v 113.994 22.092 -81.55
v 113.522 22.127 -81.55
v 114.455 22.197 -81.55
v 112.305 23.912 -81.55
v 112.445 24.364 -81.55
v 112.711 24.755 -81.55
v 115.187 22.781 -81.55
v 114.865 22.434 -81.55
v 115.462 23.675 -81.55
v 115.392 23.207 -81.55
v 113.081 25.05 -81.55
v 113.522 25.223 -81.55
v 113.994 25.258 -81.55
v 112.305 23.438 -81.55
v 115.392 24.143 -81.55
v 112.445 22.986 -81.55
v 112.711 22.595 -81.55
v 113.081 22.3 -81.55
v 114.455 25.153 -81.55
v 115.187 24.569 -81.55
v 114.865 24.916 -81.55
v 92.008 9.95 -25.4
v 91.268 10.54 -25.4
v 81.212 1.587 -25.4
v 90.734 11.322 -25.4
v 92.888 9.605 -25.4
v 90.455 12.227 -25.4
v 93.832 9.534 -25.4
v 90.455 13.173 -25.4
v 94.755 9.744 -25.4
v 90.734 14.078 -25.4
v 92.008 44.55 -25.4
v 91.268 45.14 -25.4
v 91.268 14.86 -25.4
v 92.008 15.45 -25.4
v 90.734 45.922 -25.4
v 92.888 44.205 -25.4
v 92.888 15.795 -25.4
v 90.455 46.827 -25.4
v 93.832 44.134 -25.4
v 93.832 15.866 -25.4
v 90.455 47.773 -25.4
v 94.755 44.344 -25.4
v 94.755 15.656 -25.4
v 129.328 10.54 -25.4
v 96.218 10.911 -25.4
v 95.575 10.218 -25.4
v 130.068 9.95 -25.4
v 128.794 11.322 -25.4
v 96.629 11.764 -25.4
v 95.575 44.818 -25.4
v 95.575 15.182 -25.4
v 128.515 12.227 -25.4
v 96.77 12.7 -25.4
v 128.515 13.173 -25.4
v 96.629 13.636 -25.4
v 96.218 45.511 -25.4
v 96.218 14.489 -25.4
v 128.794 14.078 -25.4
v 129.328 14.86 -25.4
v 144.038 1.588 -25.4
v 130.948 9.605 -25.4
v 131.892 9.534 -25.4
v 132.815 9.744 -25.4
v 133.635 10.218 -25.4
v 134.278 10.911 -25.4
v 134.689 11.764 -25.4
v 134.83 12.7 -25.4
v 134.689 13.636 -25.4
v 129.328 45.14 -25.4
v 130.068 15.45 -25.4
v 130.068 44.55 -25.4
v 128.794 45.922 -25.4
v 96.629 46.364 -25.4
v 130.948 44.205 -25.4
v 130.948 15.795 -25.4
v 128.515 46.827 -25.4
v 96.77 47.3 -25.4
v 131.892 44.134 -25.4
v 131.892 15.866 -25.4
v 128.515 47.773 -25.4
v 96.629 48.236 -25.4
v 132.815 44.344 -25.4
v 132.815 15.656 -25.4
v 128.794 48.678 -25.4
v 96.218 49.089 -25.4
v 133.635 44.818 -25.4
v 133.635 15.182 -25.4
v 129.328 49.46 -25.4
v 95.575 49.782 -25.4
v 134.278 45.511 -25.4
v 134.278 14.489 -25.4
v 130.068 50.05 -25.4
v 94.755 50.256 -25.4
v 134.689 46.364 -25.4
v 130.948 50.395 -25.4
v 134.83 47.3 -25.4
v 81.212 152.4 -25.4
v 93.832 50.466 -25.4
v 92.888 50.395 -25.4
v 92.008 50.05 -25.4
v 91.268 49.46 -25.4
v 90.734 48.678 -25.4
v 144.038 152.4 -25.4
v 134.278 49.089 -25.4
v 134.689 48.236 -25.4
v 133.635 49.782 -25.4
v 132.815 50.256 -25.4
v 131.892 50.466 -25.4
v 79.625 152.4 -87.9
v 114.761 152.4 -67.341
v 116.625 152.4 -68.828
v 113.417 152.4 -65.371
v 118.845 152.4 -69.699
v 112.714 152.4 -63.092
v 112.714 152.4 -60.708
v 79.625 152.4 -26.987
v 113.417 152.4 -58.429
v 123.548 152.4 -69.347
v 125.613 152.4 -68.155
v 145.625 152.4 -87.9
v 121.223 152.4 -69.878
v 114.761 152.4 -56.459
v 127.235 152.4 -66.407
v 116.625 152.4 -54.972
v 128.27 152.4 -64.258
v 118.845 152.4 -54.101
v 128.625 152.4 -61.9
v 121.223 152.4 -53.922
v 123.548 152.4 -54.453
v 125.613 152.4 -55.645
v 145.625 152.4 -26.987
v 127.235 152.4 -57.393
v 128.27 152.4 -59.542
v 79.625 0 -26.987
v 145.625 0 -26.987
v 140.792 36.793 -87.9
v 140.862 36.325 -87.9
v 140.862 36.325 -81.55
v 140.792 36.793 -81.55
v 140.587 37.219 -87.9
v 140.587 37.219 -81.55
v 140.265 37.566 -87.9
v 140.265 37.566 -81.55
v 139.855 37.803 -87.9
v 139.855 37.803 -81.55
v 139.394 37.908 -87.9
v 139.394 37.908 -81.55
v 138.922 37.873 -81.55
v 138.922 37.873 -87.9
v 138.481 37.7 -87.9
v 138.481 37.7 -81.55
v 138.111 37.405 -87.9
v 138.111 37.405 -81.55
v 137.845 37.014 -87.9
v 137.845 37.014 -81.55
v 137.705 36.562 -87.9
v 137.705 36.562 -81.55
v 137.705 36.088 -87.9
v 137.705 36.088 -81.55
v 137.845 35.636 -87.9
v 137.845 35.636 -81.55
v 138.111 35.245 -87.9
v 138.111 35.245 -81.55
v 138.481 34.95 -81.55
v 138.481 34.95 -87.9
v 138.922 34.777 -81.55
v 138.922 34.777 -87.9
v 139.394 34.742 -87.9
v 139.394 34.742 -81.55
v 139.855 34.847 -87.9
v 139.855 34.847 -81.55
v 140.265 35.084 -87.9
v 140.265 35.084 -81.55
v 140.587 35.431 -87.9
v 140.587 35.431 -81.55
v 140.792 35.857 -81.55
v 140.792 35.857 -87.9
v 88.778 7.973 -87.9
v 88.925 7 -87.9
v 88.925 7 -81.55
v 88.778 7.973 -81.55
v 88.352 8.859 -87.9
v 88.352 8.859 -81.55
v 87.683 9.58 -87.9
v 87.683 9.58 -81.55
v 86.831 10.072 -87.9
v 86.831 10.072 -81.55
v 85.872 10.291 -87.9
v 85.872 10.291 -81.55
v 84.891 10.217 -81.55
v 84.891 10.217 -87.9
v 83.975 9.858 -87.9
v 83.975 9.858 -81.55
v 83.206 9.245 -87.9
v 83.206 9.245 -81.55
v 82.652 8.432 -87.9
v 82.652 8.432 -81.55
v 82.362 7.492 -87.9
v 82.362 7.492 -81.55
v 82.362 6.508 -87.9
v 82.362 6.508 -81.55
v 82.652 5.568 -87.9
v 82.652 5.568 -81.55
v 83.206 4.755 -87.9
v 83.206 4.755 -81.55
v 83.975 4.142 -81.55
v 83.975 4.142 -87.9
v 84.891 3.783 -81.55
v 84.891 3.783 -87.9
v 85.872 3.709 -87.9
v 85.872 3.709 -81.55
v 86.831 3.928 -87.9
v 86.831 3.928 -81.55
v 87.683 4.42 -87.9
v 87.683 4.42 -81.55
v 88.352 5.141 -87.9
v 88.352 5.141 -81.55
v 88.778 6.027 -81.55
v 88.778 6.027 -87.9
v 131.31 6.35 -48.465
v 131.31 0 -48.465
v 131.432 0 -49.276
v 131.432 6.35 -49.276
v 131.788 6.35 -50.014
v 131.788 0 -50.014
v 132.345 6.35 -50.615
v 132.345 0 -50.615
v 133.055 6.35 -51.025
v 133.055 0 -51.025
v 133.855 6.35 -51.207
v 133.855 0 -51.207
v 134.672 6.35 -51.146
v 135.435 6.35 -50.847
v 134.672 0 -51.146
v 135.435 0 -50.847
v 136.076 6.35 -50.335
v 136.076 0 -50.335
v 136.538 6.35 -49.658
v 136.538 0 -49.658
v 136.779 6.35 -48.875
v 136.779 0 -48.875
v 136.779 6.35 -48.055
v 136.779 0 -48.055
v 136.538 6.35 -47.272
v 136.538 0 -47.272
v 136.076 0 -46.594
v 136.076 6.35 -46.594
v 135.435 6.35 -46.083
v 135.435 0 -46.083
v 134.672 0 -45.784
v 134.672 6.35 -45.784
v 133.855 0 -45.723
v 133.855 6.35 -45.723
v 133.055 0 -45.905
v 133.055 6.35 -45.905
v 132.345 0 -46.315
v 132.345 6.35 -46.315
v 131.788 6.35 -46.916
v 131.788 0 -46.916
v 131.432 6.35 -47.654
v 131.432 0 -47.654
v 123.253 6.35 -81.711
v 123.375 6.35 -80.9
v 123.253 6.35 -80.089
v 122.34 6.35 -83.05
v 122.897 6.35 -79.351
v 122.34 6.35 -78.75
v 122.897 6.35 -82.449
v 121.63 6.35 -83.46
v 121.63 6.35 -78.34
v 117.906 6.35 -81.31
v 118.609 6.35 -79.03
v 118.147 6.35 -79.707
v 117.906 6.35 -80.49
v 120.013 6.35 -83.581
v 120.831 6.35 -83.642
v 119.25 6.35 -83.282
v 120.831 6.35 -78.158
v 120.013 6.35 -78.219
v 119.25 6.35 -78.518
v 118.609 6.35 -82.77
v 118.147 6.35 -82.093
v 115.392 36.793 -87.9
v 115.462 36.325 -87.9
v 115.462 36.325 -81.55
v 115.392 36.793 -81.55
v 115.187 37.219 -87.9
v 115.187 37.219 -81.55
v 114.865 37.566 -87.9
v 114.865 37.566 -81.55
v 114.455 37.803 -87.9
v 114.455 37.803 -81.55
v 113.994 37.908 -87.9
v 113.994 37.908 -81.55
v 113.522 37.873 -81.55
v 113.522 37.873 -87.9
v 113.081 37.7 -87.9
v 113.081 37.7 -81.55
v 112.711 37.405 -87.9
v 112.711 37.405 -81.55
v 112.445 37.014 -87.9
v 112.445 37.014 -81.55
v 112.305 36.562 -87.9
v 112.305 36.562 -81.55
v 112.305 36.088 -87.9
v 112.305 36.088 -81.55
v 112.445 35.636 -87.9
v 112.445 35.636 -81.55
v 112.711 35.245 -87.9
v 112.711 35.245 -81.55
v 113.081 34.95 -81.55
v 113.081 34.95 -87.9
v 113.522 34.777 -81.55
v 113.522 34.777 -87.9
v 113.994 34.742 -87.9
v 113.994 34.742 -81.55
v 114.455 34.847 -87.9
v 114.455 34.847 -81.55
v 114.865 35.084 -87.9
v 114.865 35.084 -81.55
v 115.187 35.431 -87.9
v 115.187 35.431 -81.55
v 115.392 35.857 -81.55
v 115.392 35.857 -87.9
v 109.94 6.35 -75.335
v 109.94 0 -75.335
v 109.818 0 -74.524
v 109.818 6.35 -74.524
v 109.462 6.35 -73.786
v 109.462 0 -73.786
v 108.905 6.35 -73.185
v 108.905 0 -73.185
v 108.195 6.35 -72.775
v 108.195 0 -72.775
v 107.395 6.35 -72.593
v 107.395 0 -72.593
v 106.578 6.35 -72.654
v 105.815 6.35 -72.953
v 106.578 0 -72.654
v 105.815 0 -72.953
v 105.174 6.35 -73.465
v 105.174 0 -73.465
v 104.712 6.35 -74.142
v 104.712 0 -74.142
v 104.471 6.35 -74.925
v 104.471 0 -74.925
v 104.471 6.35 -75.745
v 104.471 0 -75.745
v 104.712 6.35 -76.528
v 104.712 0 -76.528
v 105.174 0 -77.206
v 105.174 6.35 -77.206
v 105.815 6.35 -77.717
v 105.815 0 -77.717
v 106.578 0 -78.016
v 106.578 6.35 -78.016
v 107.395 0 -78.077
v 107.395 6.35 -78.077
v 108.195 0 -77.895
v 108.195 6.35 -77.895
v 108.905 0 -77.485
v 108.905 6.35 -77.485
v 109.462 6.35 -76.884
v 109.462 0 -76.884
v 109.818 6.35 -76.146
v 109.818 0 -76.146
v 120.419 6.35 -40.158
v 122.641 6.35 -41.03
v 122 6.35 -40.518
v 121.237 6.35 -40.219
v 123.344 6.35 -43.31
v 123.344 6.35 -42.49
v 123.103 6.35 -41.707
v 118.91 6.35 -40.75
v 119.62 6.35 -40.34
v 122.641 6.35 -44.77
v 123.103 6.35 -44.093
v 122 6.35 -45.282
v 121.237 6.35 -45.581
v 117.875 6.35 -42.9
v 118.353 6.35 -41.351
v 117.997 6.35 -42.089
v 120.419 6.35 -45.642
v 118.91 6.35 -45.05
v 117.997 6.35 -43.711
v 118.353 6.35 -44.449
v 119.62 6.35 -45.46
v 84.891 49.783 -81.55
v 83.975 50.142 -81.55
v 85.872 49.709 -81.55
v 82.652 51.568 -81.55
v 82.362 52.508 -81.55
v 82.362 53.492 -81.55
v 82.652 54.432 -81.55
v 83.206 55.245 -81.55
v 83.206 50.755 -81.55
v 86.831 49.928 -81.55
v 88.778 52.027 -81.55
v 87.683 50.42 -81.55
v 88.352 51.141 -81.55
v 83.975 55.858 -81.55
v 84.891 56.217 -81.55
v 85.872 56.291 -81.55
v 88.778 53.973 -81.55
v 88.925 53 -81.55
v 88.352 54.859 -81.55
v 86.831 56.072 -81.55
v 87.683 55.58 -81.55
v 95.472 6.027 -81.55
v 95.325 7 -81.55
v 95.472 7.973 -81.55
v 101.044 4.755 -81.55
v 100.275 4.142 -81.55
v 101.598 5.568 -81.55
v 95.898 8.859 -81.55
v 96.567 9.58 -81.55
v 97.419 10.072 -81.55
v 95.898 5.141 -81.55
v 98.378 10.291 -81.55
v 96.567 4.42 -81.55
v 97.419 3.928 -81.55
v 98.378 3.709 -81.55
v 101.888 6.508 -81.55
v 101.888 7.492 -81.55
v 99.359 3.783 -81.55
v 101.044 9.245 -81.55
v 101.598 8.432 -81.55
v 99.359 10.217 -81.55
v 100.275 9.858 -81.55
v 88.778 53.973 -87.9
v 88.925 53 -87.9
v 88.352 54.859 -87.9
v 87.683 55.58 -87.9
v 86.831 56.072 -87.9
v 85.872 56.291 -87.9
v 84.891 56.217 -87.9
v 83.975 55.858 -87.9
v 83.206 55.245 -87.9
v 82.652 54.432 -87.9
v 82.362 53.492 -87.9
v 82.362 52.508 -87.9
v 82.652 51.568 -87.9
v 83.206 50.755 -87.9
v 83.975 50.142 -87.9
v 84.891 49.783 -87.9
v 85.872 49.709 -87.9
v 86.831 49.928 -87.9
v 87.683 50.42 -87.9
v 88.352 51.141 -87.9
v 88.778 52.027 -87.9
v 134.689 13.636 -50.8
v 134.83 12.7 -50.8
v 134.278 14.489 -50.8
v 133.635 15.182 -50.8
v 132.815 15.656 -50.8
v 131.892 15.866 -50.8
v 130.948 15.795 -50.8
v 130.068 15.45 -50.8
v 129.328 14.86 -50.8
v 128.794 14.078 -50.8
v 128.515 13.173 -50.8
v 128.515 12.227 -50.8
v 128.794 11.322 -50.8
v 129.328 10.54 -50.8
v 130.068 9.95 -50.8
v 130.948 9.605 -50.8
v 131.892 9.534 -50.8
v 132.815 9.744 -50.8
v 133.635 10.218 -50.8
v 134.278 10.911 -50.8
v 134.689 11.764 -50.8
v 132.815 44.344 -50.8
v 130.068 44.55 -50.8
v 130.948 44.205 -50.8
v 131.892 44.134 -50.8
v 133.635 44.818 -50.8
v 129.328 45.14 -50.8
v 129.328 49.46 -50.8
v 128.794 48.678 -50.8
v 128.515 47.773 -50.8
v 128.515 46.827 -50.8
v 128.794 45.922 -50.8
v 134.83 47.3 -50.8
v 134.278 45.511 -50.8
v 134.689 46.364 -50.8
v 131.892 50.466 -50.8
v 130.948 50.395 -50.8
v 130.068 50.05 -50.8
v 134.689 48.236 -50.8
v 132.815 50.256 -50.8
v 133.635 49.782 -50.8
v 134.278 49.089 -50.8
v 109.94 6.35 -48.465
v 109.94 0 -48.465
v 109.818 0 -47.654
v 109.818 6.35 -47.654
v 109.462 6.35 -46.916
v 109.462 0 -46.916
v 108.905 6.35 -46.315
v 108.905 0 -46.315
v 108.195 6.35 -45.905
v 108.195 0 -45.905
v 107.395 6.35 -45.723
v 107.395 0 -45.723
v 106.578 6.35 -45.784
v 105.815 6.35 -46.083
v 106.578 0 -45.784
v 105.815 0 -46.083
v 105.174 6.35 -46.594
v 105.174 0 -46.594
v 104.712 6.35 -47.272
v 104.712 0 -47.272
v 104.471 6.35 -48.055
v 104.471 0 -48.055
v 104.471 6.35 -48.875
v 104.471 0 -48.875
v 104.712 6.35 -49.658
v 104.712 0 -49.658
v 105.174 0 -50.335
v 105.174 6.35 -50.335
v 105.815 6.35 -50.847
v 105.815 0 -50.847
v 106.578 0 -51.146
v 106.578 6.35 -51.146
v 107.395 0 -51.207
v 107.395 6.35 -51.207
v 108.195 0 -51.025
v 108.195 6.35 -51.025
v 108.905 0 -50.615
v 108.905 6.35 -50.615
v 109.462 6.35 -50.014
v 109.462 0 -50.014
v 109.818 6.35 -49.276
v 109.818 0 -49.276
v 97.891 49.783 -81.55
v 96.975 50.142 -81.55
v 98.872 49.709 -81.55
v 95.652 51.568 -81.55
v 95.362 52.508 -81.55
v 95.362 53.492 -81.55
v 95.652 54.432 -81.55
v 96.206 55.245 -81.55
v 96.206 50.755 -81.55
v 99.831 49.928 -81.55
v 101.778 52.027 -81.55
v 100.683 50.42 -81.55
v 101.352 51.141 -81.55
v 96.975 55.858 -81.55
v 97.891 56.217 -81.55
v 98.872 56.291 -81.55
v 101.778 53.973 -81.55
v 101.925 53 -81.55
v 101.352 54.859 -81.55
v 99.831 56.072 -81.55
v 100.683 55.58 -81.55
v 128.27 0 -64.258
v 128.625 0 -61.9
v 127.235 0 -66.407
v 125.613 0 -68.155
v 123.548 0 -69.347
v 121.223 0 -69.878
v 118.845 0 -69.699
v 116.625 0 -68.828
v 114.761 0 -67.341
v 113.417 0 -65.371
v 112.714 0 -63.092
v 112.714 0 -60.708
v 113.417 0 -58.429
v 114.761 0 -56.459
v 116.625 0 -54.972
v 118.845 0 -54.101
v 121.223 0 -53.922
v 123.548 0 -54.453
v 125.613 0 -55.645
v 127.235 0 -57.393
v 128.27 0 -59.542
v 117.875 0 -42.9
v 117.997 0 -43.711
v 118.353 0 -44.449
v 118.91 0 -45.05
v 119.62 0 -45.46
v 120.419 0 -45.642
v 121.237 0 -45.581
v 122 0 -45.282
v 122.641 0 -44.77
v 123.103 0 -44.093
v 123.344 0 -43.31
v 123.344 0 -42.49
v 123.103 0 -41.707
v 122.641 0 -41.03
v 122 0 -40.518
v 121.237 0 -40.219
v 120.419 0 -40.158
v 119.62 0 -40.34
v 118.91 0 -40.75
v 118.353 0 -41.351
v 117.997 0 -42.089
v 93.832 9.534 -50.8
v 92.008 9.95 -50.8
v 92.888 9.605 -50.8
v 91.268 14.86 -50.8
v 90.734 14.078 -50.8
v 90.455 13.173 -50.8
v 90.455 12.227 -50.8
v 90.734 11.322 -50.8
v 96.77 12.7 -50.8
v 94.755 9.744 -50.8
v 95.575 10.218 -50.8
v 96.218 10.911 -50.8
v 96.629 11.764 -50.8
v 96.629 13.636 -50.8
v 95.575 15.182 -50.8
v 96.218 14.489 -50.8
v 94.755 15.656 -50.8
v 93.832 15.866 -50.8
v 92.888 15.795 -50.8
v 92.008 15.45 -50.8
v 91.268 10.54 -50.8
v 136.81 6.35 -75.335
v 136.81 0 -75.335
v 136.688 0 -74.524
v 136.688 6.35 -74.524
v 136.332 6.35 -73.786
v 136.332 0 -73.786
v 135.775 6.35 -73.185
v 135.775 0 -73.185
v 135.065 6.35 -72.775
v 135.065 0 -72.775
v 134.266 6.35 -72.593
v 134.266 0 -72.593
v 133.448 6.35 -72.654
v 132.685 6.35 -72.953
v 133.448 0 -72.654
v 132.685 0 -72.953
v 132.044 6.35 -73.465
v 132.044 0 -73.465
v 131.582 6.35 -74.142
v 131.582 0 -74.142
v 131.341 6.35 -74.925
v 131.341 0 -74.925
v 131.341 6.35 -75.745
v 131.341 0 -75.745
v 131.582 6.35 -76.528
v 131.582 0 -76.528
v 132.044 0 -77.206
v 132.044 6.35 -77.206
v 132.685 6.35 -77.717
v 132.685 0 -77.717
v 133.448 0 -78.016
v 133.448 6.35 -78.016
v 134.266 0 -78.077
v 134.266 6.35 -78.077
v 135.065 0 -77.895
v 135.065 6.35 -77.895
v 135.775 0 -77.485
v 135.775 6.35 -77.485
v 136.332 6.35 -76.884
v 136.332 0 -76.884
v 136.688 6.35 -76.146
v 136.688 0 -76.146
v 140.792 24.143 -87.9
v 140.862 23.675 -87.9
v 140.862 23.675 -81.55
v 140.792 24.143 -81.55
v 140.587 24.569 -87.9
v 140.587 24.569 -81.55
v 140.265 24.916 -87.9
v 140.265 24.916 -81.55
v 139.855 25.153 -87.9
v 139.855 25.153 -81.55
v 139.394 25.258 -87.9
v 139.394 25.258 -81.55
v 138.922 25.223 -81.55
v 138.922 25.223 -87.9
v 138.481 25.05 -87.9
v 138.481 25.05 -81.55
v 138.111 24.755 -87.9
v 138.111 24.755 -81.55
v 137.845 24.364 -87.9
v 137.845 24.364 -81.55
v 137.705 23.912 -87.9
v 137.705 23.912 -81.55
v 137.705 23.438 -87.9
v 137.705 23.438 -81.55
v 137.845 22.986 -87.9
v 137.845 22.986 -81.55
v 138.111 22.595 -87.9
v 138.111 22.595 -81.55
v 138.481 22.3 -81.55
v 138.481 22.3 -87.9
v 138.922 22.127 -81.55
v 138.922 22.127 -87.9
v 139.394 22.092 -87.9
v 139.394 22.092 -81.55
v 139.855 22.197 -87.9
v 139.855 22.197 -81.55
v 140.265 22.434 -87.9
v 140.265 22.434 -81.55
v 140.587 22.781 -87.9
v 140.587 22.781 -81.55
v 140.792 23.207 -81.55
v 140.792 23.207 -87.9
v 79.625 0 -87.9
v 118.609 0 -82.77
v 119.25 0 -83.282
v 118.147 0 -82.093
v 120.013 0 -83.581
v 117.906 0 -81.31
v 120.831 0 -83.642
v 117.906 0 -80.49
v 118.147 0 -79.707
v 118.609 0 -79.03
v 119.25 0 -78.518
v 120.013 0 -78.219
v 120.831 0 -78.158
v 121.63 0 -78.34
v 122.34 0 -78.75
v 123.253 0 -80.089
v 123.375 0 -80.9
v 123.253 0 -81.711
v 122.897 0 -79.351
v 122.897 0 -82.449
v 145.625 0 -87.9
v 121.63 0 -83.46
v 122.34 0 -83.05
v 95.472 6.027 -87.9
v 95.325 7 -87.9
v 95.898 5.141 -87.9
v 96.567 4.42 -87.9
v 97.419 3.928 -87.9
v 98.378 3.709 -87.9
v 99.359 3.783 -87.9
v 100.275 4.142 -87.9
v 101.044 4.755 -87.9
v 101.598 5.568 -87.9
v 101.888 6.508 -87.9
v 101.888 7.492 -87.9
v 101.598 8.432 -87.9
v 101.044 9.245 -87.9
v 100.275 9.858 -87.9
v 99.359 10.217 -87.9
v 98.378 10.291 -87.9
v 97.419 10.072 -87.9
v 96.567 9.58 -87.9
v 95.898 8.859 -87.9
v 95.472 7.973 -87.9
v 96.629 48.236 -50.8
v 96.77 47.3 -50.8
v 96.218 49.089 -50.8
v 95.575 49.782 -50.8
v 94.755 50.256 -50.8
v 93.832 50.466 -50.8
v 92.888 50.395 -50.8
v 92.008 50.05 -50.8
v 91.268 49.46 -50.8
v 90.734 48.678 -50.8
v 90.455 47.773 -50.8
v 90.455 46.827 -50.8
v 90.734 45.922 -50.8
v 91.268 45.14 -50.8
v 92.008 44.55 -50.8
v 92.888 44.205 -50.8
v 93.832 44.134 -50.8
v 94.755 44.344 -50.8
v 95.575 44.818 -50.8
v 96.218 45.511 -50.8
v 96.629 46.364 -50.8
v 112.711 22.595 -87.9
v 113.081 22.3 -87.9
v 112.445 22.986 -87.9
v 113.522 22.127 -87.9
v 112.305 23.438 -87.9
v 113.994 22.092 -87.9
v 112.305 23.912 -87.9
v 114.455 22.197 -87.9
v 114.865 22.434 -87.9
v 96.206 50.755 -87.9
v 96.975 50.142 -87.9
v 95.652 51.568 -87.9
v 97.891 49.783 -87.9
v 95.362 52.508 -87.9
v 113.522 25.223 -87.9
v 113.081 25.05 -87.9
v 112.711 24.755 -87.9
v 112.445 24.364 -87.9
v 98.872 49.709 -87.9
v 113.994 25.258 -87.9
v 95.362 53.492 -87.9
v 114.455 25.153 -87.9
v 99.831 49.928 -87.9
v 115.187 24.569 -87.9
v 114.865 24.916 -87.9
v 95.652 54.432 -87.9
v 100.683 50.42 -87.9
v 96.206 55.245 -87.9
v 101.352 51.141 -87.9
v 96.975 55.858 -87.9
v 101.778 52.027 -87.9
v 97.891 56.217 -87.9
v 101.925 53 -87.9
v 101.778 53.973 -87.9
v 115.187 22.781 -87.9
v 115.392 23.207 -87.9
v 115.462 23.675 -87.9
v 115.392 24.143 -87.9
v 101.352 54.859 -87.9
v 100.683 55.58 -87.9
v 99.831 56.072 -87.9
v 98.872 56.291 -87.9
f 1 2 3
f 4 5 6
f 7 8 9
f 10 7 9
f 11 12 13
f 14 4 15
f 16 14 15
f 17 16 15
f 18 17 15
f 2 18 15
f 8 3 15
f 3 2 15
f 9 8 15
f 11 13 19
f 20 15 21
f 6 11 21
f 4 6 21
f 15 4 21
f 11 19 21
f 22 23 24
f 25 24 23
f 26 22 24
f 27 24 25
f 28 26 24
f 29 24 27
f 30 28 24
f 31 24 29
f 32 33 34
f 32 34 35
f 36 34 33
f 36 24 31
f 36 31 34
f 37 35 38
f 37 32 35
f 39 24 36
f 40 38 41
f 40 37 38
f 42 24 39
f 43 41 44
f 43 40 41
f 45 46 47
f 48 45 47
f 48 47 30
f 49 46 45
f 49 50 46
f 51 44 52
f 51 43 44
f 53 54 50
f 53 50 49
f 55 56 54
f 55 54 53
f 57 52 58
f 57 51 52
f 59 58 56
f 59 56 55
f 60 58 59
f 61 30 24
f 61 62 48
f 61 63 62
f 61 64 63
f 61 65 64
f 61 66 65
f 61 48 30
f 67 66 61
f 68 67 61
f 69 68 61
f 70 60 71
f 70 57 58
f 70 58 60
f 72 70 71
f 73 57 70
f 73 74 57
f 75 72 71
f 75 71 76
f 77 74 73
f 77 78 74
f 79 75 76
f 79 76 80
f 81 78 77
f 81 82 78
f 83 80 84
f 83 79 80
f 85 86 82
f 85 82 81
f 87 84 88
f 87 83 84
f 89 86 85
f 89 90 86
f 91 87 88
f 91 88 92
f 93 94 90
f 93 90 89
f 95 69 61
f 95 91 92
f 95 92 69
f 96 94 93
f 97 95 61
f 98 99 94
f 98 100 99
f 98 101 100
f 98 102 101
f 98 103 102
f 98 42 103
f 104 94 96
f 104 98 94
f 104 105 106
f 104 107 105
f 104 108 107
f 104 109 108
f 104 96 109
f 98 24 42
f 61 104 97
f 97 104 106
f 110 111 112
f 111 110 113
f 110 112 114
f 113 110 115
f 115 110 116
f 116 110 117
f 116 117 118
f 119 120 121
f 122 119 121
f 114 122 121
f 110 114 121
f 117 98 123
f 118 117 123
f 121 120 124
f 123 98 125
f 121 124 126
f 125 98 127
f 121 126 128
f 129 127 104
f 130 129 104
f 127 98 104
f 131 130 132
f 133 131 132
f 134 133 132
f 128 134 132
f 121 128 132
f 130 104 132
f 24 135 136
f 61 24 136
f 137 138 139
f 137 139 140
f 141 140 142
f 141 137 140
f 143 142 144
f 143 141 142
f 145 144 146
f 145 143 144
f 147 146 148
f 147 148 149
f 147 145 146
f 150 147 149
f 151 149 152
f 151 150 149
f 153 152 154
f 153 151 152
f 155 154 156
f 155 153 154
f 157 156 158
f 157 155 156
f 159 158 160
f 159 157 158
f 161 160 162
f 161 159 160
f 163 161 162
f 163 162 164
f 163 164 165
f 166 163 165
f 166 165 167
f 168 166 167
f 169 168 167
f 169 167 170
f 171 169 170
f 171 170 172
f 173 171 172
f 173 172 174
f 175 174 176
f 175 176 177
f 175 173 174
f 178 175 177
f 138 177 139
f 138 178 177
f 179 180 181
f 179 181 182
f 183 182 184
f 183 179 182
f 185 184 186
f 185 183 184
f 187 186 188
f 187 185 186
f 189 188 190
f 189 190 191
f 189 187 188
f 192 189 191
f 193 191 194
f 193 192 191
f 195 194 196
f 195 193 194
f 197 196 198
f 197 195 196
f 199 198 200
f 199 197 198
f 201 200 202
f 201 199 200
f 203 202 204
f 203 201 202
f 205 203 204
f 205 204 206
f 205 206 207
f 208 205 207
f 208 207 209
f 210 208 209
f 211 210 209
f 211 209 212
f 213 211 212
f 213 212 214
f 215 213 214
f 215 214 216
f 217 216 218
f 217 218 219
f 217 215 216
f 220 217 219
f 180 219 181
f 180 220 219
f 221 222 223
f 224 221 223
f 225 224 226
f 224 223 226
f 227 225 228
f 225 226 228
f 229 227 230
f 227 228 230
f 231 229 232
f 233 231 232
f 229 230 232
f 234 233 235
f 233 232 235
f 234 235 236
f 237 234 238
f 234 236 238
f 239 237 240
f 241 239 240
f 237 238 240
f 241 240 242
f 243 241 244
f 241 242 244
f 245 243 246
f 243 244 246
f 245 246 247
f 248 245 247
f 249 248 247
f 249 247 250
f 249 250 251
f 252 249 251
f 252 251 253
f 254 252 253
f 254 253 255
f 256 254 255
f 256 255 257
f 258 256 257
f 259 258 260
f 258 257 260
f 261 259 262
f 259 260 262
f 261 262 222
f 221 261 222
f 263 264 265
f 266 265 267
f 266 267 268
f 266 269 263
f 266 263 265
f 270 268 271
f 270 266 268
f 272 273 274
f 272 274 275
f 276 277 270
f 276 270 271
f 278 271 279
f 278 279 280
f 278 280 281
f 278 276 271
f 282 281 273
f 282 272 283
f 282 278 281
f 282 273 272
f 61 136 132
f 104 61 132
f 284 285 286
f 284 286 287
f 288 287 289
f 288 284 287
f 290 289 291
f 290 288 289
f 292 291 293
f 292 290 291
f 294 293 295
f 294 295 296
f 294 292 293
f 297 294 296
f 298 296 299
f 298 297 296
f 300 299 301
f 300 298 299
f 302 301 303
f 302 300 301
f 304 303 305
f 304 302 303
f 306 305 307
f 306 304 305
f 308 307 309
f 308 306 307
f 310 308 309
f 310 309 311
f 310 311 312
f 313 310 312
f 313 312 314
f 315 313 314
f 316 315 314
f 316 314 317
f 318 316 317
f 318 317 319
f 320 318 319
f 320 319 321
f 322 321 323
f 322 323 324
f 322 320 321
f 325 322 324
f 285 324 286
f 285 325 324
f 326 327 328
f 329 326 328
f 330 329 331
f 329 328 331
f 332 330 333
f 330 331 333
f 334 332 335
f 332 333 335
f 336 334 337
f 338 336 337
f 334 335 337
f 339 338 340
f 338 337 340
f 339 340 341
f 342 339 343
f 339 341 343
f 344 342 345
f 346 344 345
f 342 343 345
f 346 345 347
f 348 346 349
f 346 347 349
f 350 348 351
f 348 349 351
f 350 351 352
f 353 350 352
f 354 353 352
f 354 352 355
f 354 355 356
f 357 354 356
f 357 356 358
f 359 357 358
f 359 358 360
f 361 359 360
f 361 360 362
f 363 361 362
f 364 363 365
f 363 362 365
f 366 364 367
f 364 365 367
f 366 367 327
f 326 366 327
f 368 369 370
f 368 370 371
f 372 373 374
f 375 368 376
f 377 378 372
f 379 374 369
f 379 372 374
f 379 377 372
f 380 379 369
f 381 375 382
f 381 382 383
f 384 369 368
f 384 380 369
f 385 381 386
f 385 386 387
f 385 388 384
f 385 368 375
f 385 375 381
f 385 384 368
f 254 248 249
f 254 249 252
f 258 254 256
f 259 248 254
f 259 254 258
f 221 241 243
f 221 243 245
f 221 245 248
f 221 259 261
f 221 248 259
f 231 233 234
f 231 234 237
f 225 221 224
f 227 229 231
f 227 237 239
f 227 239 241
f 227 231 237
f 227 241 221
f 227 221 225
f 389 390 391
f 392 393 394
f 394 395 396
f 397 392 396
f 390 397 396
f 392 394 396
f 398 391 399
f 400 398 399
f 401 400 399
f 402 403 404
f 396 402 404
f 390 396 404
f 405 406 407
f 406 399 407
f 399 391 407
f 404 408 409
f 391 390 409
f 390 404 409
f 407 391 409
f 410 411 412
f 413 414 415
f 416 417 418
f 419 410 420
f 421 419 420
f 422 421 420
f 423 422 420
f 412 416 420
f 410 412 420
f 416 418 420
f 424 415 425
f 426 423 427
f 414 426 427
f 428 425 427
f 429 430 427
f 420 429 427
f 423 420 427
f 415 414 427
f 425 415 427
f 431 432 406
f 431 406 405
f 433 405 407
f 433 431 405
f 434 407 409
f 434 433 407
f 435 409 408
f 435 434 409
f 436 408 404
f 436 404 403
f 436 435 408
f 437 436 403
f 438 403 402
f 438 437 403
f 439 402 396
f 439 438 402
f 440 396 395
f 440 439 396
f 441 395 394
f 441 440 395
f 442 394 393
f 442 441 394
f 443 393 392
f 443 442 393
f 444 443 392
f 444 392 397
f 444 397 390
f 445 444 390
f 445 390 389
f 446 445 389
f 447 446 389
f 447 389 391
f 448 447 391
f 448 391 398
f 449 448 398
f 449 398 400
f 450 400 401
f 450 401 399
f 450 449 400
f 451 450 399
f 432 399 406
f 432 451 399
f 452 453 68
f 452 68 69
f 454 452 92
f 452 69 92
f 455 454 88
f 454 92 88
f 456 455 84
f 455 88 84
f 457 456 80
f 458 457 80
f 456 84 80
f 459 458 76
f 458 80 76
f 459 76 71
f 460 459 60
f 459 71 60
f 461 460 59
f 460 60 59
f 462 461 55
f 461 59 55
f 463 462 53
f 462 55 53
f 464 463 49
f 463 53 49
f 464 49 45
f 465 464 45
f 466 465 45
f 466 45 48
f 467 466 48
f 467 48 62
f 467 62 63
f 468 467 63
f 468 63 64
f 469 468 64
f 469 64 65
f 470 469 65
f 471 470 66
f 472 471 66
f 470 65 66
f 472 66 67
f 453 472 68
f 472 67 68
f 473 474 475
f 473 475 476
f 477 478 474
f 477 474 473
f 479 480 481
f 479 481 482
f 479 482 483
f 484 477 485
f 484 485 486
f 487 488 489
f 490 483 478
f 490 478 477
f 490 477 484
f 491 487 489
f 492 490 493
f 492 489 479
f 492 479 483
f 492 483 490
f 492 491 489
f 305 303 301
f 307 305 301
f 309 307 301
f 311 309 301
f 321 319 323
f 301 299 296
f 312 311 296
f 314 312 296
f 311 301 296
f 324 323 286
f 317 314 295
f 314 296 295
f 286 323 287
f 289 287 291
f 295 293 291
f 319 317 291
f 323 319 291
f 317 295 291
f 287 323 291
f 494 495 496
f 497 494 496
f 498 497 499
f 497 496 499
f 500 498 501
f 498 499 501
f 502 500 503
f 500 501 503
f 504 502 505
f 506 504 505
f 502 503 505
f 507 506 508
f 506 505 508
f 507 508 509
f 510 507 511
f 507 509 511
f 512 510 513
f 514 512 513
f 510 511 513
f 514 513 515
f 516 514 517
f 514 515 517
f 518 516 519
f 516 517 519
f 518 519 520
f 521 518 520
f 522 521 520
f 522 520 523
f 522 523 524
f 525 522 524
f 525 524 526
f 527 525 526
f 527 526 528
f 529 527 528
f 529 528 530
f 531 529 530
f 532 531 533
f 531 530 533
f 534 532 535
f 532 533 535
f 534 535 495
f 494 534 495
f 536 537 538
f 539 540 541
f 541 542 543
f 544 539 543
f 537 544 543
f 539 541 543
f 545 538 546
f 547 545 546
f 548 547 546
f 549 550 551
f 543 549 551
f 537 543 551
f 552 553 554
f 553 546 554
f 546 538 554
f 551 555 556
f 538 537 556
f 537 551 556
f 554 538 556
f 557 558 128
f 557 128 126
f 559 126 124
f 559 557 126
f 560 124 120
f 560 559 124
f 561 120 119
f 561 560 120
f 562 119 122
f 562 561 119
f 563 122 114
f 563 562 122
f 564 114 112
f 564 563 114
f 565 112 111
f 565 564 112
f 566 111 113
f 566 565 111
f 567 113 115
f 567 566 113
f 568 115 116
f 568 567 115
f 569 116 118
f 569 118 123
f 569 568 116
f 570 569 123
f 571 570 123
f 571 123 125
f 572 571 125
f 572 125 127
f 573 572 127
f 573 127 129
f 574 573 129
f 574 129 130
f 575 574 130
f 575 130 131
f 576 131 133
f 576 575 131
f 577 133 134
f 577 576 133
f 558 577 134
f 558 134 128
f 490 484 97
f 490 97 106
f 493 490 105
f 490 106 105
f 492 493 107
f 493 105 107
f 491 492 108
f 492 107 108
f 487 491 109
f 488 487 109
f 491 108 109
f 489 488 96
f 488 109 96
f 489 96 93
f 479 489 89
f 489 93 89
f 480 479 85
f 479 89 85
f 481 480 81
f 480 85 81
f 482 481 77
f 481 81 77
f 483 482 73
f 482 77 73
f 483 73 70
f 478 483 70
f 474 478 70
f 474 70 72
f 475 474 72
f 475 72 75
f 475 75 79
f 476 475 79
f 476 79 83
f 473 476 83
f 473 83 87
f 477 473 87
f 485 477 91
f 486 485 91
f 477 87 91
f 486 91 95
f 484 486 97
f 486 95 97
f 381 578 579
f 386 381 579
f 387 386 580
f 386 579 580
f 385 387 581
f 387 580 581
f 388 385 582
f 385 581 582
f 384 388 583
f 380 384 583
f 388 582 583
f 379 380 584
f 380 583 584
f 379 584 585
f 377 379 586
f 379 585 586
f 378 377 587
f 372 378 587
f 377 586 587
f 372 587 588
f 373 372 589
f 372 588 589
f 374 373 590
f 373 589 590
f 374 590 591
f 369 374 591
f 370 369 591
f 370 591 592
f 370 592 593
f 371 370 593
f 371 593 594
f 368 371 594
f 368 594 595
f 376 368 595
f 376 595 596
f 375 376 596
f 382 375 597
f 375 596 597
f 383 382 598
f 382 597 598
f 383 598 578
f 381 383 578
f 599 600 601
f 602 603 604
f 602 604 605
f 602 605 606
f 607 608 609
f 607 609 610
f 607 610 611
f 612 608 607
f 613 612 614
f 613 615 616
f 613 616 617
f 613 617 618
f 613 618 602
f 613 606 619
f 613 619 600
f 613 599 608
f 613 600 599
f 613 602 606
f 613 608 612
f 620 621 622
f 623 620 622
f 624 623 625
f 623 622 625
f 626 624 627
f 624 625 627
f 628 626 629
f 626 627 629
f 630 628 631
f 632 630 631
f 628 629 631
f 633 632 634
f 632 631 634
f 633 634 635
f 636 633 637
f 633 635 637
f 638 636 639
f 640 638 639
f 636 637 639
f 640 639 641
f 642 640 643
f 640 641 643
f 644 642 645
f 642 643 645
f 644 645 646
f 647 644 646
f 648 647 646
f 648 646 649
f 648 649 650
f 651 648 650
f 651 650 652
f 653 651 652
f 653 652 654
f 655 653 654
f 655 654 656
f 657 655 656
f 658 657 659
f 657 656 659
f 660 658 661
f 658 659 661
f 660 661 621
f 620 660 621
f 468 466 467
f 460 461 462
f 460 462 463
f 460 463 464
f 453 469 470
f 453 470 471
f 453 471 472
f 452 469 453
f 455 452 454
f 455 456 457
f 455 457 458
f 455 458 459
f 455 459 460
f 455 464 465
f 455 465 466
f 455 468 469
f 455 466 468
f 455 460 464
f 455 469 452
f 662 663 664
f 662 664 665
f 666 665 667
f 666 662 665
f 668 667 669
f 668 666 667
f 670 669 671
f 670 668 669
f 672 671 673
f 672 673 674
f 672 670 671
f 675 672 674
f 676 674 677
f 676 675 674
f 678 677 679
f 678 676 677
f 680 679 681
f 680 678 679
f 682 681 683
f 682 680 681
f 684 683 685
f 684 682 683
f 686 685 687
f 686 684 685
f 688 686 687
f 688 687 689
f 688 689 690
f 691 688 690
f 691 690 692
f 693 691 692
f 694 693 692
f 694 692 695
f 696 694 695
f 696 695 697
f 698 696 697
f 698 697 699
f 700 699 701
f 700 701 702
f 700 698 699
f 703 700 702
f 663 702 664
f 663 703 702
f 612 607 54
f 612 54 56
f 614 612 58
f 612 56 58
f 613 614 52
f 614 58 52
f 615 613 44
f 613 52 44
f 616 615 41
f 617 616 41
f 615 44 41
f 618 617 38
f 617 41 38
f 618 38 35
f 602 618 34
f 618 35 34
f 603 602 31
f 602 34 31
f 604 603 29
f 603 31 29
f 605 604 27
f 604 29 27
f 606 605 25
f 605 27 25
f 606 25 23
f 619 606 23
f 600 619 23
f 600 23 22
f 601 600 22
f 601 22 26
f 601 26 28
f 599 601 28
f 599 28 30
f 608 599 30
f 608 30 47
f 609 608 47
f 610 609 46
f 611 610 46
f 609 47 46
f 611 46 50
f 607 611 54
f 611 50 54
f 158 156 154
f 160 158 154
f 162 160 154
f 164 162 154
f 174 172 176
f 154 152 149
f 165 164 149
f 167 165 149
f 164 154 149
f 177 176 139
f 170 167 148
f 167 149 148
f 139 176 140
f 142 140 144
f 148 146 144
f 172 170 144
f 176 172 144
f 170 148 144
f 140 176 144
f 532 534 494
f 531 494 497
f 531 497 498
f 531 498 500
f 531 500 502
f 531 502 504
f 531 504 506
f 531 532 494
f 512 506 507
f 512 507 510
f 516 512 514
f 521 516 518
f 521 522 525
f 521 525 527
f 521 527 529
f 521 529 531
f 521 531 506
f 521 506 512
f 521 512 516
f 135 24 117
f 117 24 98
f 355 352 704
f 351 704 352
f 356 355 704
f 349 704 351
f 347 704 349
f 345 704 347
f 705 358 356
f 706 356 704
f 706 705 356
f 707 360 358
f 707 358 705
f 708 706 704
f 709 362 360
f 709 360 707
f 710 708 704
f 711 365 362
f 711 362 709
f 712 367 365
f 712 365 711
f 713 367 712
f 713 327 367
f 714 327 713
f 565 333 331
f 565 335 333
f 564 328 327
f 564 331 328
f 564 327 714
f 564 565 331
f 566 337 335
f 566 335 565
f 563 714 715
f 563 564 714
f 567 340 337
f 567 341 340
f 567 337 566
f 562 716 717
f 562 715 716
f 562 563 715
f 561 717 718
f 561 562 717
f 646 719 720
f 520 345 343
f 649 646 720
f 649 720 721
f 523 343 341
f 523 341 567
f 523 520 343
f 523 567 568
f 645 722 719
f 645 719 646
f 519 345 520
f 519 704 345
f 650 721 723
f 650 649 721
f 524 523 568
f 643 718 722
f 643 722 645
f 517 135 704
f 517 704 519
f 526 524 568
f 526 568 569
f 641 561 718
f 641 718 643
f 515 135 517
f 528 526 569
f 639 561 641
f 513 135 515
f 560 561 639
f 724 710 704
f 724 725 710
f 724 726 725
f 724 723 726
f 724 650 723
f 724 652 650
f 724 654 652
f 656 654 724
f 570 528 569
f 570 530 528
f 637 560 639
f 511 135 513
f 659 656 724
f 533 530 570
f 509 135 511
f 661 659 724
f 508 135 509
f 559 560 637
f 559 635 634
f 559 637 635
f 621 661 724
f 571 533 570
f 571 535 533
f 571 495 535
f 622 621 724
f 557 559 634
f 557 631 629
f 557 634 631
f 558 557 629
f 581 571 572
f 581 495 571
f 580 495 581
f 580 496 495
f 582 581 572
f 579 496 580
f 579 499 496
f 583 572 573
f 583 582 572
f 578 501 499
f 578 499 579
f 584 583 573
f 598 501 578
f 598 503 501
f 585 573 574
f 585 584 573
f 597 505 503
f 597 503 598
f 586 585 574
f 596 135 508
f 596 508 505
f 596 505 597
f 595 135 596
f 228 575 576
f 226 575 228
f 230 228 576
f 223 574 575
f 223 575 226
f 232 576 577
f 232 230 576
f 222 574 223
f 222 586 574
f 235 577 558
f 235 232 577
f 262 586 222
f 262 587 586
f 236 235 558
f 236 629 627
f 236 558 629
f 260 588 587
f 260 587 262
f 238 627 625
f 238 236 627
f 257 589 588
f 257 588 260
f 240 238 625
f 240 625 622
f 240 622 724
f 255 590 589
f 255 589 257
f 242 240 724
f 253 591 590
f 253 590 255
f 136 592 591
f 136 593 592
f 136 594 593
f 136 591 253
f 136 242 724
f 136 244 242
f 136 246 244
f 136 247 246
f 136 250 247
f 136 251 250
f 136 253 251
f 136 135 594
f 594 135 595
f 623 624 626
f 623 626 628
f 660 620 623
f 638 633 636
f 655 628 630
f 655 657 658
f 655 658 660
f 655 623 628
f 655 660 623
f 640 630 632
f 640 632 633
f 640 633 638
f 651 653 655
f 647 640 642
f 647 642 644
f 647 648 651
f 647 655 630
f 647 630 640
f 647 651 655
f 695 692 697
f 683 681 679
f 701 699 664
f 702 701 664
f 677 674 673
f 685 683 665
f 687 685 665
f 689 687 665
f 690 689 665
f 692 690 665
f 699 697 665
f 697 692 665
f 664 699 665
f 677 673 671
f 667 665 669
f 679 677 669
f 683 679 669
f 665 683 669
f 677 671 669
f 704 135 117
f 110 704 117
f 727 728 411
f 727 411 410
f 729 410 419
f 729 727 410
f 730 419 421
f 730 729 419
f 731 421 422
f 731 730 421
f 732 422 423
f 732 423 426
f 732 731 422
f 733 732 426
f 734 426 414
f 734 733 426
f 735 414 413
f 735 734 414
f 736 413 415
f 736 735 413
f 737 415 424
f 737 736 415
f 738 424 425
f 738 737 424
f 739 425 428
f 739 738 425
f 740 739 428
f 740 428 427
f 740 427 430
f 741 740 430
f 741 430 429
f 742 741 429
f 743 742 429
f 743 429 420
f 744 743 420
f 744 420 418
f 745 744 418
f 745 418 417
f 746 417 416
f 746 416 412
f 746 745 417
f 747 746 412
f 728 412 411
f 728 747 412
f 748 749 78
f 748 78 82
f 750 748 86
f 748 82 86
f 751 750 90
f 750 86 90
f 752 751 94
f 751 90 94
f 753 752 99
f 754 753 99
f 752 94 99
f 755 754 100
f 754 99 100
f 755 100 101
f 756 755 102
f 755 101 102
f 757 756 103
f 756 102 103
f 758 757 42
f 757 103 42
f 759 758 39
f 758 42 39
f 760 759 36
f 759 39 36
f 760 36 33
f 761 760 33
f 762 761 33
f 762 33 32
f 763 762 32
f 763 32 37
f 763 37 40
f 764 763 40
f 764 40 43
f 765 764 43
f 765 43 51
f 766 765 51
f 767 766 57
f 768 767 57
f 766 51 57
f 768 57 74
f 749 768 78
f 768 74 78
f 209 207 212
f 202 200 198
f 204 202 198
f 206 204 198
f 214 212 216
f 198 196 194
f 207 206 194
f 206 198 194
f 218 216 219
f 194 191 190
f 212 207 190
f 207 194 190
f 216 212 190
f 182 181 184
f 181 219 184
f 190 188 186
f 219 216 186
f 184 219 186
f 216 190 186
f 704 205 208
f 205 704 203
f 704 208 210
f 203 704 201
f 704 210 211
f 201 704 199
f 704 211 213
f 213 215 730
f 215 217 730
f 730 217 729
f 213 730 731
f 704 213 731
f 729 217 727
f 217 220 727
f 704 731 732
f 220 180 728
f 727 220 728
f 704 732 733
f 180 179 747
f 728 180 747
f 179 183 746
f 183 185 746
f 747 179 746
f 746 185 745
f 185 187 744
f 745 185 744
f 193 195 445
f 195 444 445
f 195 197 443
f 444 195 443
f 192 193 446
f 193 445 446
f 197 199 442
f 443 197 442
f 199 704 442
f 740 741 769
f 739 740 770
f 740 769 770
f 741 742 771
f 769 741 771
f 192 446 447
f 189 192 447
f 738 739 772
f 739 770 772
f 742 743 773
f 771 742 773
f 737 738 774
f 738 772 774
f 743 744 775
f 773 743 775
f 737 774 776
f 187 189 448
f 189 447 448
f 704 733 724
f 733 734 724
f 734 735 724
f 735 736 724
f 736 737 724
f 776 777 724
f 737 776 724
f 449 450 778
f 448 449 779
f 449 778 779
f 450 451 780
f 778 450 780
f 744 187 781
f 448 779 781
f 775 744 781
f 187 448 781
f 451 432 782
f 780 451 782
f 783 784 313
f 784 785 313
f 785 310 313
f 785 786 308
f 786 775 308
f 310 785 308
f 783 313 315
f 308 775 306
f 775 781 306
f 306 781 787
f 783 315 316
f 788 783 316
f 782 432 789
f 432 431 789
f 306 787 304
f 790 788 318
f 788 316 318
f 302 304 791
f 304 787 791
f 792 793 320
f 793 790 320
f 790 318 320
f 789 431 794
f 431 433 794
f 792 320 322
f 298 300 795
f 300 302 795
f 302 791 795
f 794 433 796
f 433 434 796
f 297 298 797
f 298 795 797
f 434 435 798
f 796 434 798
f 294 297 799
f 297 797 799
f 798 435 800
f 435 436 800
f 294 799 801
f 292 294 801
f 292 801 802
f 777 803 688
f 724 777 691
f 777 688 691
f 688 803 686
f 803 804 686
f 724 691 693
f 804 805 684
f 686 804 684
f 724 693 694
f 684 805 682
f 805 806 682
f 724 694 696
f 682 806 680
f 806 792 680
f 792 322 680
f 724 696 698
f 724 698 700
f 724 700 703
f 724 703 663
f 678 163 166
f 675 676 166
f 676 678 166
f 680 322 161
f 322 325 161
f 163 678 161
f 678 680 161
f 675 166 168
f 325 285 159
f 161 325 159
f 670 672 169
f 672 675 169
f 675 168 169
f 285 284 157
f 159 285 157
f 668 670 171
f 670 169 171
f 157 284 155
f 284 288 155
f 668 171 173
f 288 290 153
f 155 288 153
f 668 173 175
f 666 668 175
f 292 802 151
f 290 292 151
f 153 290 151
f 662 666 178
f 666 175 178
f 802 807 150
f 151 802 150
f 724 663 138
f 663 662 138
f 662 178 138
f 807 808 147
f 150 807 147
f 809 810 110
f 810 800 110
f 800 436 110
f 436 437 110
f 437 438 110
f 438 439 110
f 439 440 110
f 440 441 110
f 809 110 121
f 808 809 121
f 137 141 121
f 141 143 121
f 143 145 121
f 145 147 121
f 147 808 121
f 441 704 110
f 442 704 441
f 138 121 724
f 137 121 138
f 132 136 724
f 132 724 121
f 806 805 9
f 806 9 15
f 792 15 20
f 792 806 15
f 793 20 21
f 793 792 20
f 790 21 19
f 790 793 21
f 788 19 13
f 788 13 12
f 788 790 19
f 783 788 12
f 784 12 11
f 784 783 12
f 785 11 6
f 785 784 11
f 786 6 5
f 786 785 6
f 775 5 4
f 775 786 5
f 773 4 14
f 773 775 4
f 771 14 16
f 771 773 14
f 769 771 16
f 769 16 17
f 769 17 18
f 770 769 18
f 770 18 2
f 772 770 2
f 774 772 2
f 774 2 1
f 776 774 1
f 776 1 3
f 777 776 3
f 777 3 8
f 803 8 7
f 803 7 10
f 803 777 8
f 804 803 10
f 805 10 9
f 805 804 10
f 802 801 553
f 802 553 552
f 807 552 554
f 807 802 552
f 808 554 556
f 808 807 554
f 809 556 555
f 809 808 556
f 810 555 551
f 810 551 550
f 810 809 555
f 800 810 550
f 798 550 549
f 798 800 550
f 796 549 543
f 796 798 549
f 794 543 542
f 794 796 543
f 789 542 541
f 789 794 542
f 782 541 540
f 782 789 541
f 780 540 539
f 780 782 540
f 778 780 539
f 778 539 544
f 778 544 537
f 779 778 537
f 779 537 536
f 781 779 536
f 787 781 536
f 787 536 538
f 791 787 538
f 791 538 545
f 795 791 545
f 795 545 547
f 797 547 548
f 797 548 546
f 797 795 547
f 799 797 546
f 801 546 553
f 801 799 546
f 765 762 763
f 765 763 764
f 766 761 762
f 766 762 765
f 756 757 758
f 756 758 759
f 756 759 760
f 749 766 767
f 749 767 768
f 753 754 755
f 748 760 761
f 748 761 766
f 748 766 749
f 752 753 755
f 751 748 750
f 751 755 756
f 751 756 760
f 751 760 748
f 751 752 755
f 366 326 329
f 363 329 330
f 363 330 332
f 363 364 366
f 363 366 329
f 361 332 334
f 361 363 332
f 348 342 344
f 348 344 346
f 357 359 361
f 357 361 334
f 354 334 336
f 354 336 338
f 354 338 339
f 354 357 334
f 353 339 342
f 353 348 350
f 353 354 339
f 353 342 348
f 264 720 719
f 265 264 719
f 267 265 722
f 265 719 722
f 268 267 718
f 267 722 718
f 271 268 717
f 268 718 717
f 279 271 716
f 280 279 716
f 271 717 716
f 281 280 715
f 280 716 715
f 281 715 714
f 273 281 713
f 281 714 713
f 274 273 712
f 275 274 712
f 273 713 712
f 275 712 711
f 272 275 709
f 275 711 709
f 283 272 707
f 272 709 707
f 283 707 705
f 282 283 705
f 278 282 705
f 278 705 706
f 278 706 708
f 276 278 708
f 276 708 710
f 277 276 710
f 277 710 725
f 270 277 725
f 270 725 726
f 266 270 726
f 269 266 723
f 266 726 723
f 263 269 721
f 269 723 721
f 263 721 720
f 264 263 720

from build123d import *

# Parameters (mm, degrees)
PRIMARY_START           = -25.4
SKETCH2_W               = 66
SKETCH2_H               = 60
SKETCH2_R               = 1.5875
SKETCH2_H_2             = 92.4
PRIMARY_EXTRUSION_DEPTH = 62.5
CUT_EXTRUDE2_START      = -25.4
SKETCH3_R               = 3.175
CUT_EXTRUDE2_DEPTH      = 25.4
CUT_EXTRUDE3_START      = -87.9
SKETCH2_4_R             = 1.5875
CUT_EXTRUDE3_DEPTH      = 6.35
CHAMFER1_SIZE           = 1.5875
CUT_EXTRUDE4_DEPTH      = 6.35
CUT_EXTRUDE5_OUTLINE_R  = 8
CUT_EXTRUDE5_DEPTH      = 152.4


# Read off the part's stored shape, not the designer's step: Cut-Extrude5
with BuildPart() as part:
    # Sketch2 → Primary Extrusion (new body)
    # profile 1 of 10: a face of its own
    with BuildSketch(Plane.XY.offset(PRIMARY_START)):
        with Locations((112.625, 30)):
            Rectangle(SKETCH2_W, SKETCH2_H)
        with BuildLine():
            ThreePointArc((88.925, 7), (85.625, 3.7), (82.325, 7))
            ThreePointArc((82.325, 7), (85.625, 10.3), (88.925, 7))
        make_face(mode=Mode.SUBTRACT)
        with BuildLine():
            ThreePointArc((95.325, 7), (98.625, 10.3), (101.925, 7))
            ThreePointArc((101.925, 7), (98.625, 3.7), (95.325, 7))
        make_face(mode=Mode.SUBTRACT)
        with Locations((113.875, 23.675)):
            Circle(SKETCH2_R, mode=Mode.SUBTRACT)
        with Locations((139.275, 23.675)):
            Circle(SKETCH2_R, mode=Mode.SUBTRACT)
        with Locations((113.875, 36.325)):
            Circle(SKETCH2_R, mode=Mode.SUBTRACT)
        with Locations((139.275, 36.325)):
            Circle(SKETCH2_R, mode=Mode.SUBTRACT)
        with BuildLine():
            ThreePointArc((88.925, 53), (85.625, 49.7), (82.325, 53))
            ThreePointArc((82.325, 53), (85.625, 56.3), (88.925, 53))
        make_face(mode=Mode.SUBTRACT)
        with BuildLine():
            ThreePointArc((101.925, 53), (98.625, 49.7), (95.325, 53))
            ThreePointArc((95.325, 53), (98.625, 56.3), (101.925, 53))
        make_face(mode=Mode.SUBTRACT)
    # profile 2 of 10: a face of its own
    with BuildSketch(Plane.XY.offset(PRIMARY_START)):
        with BuildLine():
            ThreePointArc((82.325, 53), (85.625, 49.7), (88.925, 53))
            ThreePointArc((88.925, 53), (85.625, 56.3), (82.325, 53))
        make_face()
    # profile 3 of 10: a face of its own
    with BuildSketch(Plane.XY.offset(PRIMARY_START)):
        with BuildLine():
            ThreePointArc((95.325, 53), (98.625, 49.7), (101.925, 53))
            ThreePointArc((101.925, 53), (98.625, 56.3), (95.325, 53))
        make_face()
    # profile 4 of 10: a face of its own
    with BuildSketch(Plane.XY.offset(PRIMARY_START)):
        with Locations((113.875, 36.325)):
            Circle(SKETCH2_R)
    # profile 5 of 10: a face of its own
    with BuildSketch(Plane.XY.offset(PRIMARY_START)):
        with Locations((113.875, 23.675)):
            Circle(SKETCH2_R)
    # profile 6 of 10: a face of its own
    with BuildSketch(Plane.XY.offset(PRIMARY_START)):
        with Locations((139.275, 36.325)):
            Circle(SKETCH2_R)
    # profile 7 of 10: a face of its own
    with BuildSketch(Plane.XY.offset(PRIMARY_START)):
        with Locations((139.275, 23.675)):
            Circle(SKETCH2_R)
    # profile 8 of 10: a face of its own
    with BuildSketch(Plane.XY.offset(PRIMARY_START)):
        with BuildLine():
            ThreePointArc((82.325, 7), (85.625, 3.7), (88.925, 7))
            ThreePointArc((88.925, 7), (85.625, 10.3), (82.325, 7))
        make_face()
    # profile 9 of 10: a face of its own
    with BuildSketch(Plane.XY.offset(PRIMARY_START)):
        with BuildLine():
            ThreePointArc((101.925, 7), (98.625, 10.3), (95.325, 7))
            ThreePointArc((95.325, 7), (98.625, 3.7), (101.925, 7))
        make_face()
    # profile 10 of 10: a face of its own
    with BuildSketch(Plane.XY.offset(PRIMARY_START)):
        with Locations((112.625, 106.2)):
            Rectangle(SKETCH2_W, SKETCH2_H_2)
    extrude(amount=-PRIMARY_EXTRUSION_DEPTH)

    # Sketch3 → Cut-Extrude2 (cut)
    with BuildSketch(Plane.XY.offset(CUT_EXTRUDE2_START)):
        with Locations((-135.5, 47.3)):
            Circle(SKETCH3_R)
        with Locations((-135.5, 12.7)):
            Circle(SKETCH3_R)
        with Locations((93.595, 47.3)):
            Circle(SKETCH3_R)
        with Locations((131.655, 47.3)):
            Circle(SKETCH3_R)
        with Locations((131.655, 12.7)):
            Circle(SKETCH3_R)
        with Locations((93.595, 12.7)):
            Circle(SKETCH3_R)
    extrude(amount=-CUT_EXTRUDE2_DEPTH, mode=Mode.SUBTRACT)

    # Sketch2<4> → Cut-Extrude3 (cut)
    with BuildSketch(Plane.XY.offset(CUT_EXTRUDE3_START)):
        with BuildLine():
            ThreePointArc((95.325, 53), (98.625, 49.7), (101.925, 53))
            ThreePointArc((101.925, 53), (98.625, 56.3), (95.325, 53))
        make_face()
        with BuildLine():
            ThreePointArc((82.325, 53), (85.625, 49.7), (88.925, 53))
            ThreePointArc((88.925, 53), (85.625, 56.3), (82.325, 53))
        make_face()
        with BuildLine():
            ThreePointArc((101.925, 7), (98.625, 10.3), (95.325, 7))
            ThreePointArc((95.325, 7), (98.625, 3.7), (101.925, 7))
        make_face()
        with BuildLine():
            ThreePointArc((82.325, 7), (85.625, 3.7), (88.925, 7))
            ThreePointArc((88.925, 7), (85.625, 10.3), (82.325, 7))
        make_face()
        with Locations((139.275, 36.325)):
            Circle(SKETCH2_4_R)
        with Locations((113.875, 36.325)):
            Circle(SKETCH2_4_R)
        with Locations((113.875, 23.675)):
            Circle(SKETCH2_4_R)
        with Locations((139.275, 23.675)):
            Circle(SKETCH2_4_R)
    extrude(amount=CUT_EXTRUDE3_DEPTH, mode=Mode.SUBTRACT)

    # Chamfer1
    chamfer1_edges = [part.edges().sort_by_distance(p)[0] for p in [
        (112.625, 0, -25.4),
        (79.625, 76.2, -25.4),
        (145.625, 76.2, -25.4),
    ]]
    chamfer(chamfer1_edges, length=CHAMFER1_SIZE)

    # Sketch4 → Cut-Extrude4 (cut)
    with BuildSketch(Plane(origin=(0, 0, 0), x_dir=(1, 0, 0), z_dir=(0, 1, 0))):
        with BuildLine():
            ThreePointArc((131.310028843, 75.335028843), (134.060028843, 78.085028843), (136.810028843, 75.335028843))
            ThreePointArc((136.810028843, 75.335028843), (134.060028843, 72.585028843), (131.310028843, 75.335028843))
        make_face()
        with BuildLine():
            ThreePointArc((117.875, 80.9), (120.625, 83.65), (123.375, 80.9))
            ThreePointArc((123.375, 80.9), (120.625, 78.15), (117.875, 80.9))
        make_face()
        with BuildLine():
            ThreePointArc((104.439971157, 75.335028843), (107.189971157, 78.085028843), (109.939971157, 75.335028843))
            ThreePointArc((109.939971157, 75.335028843), (107.189971157, 72.585028843), (104.439971157, 75.335028843))
        make_face()
        with BuildLine():
            ThreePointArc((104.439971157, 48.464971157), (107.189971157, 51.214971157), (109.939971157, 48.464971157))
            ThreePointArc((109.939971157, 48.464971157), (107.189971157, 45.714971157), (104.439971157, 48.464971157))
        make_face()
        with BuildLine():
            ThreePointArc((123.375, 42.9), (120.625, 40.15), (117.875, 42.9))
            ThreePointArc((117.875, 42.9), (120.625, 45.65), (123.375, 42.9))
        make_face()
        with BuildLine():
            ThreePointArc((136.810028843, 48.464971157), (134.060028843, 45.714971157), (131.310028843, 48.464971157))
            ThreePointArc((131.310028843, 48.464971157), (134.060028843, 51.214971157), (136.810028843, 48.464971157))
        make_face()
    extrude(amount=CUT_EXTRUDE4_DEPTH, mode=Mode.SUBTRACT)

    # Cut-Extrude5 outline → Cut-Extrude5 (cut)
    with BuildSketch(Plane(origin=(0, 0, 0), x_dir=(1, 0, 0), z_dir=(0, 1, 0))):
        with Locations((120.625, 61.9)):
            Circle(CUT_EXTRUDE5_OUTLINE_R)
    extrude(amount=CUT_EXTRUDE5_DEPTH, mode=Mode.SUBTRACT)


solid = part.part
